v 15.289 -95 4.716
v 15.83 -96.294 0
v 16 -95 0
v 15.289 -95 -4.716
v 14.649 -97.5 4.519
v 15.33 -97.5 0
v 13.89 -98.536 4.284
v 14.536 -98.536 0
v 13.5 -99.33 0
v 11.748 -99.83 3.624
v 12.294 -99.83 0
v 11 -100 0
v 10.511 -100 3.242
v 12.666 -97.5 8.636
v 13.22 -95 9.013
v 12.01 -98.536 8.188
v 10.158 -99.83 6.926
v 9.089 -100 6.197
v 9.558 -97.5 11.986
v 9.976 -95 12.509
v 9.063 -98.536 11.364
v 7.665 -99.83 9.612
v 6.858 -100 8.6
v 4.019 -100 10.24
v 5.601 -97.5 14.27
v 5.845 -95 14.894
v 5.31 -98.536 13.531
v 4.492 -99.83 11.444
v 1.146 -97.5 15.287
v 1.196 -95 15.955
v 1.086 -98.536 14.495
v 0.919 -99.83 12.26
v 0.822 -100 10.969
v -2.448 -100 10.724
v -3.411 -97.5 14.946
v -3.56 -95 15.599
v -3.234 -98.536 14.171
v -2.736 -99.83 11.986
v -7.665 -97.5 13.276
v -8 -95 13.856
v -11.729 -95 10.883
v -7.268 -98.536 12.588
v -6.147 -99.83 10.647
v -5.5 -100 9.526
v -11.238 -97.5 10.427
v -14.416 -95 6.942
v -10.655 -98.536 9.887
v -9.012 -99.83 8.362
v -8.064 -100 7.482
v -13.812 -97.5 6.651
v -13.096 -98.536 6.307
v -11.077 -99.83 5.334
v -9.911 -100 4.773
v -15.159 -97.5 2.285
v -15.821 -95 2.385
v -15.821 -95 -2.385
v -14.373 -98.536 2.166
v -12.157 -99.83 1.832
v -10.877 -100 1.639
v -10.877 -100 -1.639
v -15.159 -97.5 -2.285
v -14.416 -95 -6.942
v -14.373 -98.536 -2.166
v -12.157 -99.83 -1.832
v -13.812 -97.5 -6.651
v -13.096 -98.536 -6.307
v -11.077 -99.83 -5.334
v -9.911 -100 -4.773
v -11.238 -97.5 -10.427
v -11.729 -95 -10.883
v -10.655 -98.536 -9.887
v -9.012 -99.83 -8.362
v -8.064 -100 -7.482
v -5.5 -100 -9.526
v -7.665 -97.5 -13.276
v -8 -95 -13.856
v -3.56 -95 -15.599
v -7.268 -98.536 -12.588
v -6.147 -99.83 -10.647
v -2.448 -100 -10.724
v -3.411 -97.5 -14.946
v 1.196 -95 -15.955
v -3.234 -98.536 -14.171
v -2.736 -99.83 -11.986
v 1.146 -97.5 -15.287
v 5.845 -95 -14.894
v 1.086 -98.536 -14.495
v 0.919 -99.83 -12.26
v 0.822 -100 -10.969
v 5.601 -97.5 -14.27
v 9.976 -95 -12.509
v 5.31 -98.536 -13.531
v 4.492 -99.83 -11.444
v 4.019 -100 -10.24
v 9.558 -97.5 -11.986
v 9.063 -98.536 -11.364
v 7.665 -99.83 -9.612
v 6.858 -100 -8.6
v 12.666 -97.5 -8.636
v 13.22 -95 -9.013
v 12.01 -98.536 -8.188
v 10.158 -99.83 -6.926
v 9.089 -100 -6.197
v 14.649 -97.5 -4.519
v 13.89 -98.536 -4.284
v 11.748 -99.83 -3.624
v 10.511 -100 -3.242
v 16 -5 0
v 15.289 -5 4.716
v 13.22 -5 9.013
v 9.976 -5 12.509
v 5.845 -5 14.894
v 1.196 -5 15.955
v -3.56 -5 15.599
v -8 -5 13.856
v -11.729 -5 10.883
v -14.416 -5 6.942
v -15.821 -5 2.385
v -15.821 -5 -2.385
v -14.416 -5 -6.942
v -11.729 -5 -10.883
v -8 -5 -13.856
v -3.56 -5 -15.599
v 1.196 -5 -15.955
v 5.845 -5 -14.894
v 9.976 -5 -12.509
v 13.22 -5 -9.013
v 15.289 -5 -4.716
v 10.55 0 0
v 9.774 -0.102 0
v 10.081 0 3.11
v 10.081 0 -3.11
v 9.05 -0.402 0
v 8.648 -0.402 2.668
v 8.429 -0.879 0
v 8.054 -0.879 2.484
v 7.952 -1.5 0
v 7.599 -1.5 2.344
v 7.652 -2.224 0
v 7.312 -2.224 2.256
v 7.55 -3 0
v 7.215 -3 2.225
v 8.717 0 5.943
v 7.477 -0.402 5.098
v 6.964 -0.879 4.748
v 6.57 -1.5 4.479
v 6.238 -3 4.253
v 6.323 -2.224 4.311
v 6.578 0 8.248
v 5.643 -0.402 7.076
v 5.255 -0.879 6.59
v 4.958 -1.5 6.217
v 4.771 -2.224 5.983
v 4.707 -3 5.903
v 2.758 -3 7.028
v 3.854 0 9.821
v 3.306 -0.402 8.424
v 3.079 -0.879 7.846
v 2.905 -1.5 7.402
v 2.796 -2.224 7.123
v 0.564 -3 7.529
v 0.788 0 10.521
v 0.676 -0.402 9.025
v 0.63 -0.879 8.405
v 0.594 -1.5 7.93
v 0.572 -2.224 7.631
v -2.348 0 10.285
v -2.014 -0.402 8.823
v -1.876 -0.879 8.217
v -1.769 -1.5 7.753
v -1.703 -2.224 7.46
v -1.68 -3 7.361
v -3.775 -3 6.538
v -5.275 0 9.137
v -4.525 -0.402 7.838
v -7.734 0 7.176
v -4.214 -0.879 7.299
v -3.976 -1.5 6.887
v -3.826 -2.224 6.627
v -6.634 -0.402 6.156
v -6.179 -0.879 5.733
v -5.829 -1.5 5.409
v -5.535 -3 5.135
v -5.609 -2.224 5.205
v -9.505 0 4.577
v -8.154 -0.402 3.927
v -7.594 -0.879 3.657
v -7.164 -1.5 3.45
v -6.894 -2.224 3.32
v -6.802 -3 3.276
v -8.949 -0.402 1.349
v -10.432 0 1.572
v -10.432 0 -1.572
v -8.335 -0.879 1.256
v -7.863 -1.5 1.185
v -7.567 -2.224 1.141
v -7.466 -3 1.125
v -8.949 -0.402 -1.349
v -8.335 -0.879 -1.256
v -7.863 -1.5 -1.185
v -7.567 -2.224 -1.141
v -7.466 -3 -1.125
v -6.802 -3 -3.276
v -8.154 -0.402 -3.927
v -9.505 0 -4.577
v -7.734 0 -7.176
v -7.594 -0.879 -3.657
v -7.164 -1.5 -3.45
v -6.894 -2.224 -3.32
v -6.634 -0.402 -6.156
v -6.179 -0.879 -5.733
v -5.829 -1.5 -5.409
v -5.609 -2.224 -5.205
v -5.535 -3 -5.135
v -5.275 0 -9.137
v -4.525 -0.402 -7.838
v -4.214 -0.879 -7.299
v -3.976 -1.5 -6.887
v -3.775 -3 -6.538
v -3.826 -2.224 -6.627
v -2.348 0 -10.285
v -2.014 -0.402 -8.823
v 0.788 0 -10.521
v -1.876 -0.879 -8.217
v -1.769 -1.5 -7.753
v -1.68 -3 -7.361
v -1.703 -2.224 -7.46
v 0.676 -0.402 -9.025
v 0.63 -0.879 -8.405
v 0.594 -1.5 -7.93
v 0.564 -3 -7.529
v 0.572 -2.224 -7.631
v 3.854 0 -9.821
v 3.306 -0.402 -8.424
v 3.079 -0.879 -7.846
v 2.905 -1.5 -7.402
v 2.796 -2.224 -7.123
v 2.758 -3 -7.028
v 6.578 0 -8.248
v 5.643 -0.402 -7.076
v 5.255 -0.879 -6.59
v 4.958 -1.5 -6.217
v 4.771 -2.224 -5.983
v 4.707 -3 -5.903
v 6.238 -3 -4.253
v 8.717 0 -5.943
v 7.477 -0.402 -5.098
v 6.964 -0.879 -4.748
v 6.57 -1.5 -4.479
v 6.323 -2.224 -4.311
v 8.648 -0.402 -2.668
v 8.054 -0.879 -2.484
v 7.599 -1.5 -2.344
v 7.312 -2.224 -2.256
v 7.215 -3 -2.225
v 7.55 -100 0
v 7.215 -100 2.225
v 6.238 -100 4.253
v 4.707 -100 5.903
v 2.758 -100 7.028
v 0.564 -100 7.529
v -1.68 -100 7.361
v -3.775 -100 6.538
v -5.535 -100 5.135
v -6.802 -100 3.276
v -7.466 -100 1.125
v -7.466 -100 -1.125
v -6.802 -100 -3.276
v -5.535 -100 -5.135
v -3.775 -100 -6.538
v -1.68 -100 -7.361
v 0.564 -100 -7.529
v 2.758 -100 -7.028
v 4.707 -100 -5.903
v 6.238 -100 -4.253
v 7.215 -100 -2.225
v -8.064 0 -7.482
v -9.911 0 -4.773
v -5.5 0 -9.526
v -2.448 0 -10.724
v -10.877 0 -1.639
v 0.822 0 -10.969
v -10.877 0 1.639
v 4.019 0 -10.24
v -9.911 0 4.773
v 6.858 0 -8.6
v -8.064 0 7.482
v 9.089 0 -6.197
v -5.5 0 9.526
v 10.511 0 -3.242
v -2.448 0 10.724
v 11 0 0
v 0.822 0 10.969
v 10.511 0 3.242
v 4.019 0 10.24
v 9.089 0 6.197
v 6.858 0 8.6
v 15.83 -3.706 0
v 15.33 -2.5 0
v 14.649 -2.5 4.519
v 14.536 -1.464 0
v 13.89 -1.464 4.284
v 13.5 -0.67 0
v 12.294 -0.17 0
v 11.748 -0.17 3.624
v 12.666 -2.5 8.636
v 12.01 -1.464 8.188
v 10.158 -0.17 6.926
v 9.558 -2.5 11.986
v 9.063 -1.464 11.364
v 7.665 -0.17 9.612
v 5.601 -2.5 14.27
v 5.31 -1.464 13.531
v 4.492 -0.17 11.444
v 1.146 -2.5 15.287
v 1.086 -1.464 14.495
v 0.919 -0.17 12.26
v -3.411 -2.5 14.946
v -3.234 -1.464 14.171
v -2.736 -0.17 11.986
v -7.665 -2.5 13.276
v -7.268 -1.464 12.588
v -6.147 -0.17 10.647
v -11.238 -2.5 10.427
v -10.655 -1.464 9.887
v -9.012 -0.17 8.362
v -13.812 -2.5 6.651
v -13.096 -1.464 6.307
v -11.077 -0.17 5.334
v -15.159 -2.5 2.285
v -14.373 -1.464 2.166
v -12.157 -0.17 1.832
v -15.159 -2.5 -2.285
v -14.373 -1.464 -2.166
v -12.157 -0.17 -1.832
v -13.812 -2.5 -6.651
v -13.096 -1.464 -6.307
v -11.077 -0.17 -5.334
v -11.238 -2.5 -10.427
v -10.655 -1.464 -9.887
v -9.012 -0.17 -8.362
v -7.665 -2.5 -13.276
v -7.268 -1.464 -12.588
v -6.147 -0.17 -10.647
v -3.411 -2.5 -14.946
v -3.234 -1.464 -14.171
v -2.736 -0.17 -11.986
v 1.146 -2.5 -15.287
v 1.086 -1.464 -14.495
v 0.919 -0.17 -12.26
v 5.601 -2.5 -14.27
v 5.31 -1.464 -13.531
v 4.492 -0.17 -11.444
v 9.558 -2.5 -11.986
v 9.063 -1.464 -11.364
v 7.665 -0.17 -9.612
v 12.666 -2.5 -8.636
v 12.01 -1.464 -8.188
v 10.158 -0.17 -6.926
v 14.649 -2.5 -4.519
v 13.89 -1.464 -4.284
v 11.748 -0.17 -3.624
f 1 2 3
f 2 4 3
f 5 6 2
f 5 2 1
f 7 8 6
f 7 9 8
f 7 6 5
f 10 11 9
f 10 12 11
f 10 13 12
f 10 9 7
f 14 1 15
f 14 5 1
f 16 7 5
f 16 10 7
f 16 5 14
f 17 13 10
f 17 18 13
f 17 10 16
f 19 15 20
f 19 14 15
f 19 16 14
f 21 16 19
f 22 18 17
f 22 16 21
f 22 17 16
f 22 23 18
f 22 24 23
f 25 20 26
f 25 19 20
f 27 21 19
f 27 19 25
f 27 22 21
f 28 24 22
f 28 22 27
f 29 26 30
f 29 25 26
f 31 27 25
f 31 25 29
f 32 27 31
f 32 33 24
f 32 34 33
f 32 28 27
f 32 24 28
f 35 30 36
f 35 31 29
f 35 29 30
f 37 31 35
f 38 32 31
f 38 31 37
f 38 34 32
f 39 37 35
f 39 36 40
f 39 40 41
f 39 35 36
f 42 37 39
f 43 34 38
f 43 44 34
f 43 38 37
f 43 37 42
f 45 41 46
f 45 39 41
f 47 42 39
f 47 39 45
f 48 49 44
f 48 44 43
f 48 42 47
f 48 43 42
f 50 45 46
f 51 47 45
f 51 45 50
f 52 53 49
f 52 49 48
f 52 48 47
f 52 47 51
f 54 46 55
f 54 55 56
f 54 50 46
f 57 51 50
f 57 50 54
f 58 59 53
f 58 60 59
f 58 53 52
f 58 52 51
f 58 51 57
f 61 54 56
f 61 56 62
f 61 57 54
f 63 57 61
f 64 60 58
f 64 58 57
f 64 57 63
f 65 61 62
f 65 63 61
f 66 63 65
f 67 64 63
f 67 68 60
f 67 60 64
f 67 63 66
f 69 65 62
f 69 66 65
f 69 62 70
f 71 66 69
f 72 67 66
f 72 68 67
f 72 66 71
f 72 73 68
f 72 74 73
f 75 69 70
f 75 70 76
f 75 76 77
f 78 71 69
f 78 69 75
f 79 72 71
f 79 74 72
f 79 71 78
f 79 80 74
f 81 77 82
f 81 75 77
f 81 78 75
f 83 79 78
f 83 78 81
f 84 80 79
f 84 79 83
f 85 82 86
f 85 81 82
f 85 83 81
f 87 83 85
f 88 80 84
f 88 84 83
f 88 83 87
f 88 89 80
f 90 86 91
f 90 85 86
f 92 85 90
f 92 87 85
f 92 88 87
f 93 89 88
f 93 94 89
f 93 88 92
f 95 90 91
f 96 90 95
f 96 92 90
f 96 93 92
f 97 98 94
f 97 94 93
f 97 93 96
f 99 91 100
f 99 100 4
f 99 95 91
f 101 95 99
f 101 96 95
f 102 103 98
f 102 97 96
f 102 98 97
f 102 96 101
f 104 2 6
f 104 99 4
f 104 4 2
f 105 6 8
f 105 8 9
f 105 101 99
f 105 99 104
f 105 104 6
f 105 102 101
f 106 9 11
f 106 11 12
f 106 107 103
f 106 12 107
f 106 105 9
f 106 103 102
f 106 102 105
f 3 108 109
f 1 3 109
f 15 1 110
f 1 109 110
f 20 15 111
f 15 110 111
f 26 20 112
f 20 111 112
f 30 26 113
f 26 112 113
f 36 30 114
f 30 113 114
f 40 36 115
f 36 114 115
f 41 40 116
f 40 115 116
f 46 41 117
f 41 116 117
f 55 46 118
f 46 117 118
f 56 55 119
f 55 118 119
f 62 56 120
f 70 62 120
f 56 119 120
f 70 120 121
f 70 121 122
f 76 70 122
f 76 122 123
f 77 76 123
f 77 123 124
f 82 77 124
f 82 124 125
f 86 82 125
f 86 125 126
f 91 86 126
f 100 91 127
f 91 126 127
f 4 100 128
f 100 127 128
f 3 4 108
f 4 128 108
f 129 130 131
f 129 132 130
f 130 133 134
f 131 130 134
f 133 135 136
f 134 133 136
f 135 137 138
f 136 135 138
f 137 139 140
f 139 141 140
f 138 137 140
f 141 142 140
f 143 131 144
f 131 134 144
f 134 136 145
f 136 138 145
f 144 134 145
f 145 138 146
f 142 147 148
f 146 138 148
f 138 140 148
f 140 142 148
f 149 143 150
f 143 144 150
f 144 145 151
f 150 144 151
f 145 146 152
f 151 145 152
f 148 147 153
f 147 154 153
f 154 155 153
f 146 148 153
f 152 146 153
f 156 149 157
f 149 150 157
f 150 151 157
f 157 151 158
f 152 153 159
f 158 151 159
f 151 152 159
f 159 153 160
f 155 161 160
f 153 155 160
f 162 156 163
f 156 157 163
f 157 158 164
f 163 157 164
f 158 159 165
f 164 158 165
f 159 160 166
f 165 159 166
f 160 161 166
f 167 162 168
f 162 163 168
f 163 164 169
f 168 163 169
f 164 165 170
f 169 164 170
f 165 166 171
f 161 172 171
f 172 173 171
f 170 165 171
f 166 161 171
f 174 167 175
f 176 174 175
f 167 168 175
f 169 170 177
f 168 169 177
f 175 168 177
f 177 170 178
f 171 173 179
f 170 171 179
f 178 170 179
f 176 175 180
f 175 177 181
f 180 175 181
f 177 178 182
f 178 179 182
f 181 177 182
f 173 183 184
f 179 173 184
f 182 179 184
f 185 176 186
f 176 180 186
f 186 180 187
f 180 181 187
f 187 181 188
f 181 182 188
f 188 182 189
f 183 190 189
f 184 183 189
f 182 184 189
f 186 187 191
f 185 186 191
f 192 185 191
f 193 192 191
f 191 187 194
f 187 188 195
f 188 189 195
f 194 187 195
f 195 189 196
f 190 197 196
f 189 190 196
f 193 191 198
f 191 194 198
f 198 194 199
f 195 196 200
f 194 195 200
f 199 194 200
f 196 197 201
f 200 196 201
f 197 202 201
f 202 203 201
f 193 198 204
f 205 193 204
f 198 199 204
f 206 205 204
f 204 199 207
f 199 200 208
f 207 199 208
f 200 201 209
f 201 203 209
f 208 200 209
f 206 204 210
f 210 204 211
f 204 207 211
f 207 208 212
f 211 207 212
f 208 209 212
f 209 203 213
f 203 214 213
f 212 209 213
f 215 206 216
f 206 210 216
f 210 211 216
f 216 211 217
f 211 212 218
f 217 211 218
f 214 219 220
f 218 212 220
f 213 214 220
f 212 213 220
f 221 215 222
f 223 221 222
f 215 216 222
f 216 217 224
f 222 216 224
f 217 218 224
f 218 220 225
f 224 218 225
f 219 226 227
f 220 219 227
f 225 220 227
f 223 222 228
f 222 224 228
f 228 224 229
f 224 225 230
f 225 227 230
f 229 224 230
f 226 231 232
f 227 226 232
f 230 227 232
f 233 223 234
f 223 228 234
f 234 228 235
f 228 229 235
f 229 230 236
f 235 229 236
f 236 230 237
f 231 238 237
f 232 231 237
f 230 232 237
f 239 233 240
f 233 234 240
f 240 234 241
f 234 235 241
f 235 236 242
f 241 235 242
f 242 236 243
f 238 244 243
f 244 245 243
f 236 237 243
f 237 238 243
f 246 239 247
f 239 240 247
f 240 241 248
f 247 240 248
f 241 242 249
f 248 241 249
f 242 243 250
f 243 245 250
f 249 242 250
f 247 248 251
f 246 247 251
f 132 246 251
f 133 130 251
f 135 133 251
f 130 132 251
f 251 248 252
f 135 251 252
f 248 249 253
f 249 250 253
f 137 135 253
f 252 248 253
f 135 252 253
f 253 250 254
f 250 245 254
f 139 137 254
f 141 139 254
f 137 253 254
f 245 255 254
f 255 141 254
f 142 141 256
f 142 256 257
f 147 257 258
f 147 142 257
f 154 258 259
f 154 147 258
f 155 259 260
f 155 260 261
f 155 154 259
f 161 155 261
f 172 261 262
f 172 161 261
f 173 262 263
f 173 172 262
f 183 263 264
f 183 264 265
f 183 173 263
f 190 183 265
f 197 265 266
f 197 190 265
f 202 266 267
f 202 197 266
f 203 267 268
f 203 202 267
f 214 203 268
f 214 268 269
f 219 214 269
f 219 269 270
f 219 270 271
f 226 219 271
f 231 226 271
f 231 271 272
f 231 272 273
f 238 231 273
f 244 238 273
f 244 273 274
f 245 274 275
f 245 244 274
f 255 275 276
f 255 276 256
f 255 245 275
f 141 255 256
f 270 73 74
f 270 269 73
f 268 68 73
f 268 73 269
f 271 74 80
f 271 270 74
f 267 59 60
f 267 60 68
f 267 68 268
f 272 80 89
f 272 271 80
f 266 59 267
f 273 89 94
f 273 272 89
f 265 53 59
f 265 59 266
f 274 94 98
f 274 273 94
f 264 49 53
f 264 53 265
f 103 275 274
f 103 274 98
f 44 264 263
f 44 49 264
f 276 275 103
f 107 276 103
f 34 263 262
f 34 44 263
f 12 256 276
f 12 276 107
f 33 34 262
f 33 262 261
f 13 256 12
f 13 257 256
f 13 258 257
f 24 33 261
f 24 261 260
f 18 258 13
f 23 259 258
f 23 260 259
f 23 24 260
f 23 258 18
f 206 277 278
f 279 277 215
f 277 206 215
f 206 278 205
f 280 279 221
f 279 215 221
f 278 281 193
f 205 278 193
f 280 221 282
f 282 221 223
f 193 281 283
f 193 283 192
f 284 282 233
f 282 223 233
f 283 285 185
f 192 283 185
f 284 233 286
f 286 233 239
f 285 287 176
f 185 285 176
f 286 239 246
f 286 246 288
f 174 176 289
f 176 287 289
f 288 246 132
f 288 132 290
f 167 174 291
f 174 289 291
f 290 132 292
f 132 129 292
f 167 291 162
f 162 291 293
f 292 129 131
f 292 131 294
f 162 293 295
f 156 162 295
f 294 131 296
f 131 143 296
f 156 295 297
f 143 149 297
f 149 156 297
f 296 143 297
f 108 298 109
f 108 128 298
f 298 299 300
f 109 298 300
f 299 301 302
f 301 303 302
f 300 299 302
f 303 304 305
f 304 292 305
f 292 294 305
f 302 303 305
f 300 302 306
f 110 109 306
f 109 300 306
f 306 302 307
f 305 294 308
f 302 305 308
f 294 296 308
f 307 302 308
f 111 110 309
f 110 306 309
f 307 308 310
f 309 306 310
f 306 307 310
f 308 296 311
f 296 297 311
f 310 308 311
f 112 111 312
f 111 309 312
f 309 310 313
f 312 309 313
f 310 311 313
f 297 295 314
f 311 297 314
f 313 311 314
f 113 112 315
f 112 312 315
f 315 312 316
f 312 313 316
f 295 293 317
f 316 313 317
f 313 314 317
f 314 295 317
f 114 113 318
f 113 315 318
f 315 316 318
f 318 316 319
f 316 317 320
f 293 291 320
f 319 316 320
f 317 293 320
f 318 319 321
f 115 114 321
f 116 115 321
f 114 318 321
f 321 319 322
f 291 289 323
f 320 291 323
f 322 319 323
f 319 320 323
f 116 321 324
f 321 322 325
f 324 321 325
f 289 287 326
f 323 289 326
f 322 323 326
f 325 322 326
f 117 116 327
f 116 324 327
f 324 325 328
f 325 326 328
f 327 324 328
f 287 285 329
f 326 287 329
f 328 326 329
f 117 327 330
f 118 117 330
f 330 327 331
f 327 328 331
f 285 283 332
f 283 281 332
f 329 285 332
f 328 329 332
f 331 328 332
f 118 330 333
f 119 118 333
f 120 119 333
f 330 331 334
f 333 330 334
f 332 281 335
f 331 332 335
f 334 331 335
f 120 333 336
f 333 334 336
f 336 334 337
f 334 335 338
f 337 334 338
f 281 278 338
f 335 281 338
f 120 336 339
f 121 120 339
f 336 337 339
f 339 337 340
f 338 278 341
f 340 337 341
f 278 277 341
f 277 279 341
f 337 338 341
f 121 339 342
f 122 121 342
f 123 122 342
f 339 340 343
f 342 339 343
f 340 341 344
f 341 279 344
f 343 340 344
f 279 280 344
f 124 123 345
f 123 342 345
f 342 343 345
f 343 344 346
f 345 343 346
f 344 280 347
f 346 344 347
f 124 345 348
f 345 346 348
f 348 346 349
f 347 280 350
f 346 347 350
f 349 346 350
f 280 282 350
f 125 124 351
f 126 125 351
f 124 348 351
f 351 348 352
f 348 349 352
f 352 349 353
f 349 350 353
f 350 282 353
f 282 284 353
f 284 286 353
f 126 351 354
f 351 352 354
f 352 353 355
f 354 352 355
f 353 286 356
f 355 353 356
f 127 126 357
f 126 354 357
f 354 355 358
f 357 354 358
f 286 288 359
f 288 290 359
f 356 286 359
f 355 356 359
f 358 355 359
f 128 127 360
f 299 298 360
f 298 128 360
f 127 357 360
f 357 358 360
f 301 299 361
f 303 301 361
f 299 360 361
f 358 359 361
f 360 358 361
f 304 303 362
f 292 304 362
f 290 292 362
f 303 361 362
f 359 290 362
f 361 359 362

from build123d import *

# Parameters (mm, degrees)
F0_R     = 16
F0_R_2   = 7.55
F1_DEPTH = 100
F2_R     = 5
F3_R     = 3


with BuildPart() as f1:
    # F0 (on Front) → F1 (new body)
    with BuildSketch(Plane.XZ):
        Circle(F0_R)
        Circle(F0_R_2, mode=Mode.SUBTRACT)
    extrude(amount=F1_DEPTH)

    # F2
    f2_edges = [f1.edges().sort_by_distance(p)[0] for p in [
        (-16, -100, 0),
        (-16, 0, 0),
    ]]
    fillet(f2_edges, radius=F2_R)

    # F3
    f3_edges = [f1.edges().sort_by_distance(p)[0] for p in [
        (-7.55, 0, 0),
    ]]
    fillet(f3_edges, radius=F3_R)


solid = f1.part
